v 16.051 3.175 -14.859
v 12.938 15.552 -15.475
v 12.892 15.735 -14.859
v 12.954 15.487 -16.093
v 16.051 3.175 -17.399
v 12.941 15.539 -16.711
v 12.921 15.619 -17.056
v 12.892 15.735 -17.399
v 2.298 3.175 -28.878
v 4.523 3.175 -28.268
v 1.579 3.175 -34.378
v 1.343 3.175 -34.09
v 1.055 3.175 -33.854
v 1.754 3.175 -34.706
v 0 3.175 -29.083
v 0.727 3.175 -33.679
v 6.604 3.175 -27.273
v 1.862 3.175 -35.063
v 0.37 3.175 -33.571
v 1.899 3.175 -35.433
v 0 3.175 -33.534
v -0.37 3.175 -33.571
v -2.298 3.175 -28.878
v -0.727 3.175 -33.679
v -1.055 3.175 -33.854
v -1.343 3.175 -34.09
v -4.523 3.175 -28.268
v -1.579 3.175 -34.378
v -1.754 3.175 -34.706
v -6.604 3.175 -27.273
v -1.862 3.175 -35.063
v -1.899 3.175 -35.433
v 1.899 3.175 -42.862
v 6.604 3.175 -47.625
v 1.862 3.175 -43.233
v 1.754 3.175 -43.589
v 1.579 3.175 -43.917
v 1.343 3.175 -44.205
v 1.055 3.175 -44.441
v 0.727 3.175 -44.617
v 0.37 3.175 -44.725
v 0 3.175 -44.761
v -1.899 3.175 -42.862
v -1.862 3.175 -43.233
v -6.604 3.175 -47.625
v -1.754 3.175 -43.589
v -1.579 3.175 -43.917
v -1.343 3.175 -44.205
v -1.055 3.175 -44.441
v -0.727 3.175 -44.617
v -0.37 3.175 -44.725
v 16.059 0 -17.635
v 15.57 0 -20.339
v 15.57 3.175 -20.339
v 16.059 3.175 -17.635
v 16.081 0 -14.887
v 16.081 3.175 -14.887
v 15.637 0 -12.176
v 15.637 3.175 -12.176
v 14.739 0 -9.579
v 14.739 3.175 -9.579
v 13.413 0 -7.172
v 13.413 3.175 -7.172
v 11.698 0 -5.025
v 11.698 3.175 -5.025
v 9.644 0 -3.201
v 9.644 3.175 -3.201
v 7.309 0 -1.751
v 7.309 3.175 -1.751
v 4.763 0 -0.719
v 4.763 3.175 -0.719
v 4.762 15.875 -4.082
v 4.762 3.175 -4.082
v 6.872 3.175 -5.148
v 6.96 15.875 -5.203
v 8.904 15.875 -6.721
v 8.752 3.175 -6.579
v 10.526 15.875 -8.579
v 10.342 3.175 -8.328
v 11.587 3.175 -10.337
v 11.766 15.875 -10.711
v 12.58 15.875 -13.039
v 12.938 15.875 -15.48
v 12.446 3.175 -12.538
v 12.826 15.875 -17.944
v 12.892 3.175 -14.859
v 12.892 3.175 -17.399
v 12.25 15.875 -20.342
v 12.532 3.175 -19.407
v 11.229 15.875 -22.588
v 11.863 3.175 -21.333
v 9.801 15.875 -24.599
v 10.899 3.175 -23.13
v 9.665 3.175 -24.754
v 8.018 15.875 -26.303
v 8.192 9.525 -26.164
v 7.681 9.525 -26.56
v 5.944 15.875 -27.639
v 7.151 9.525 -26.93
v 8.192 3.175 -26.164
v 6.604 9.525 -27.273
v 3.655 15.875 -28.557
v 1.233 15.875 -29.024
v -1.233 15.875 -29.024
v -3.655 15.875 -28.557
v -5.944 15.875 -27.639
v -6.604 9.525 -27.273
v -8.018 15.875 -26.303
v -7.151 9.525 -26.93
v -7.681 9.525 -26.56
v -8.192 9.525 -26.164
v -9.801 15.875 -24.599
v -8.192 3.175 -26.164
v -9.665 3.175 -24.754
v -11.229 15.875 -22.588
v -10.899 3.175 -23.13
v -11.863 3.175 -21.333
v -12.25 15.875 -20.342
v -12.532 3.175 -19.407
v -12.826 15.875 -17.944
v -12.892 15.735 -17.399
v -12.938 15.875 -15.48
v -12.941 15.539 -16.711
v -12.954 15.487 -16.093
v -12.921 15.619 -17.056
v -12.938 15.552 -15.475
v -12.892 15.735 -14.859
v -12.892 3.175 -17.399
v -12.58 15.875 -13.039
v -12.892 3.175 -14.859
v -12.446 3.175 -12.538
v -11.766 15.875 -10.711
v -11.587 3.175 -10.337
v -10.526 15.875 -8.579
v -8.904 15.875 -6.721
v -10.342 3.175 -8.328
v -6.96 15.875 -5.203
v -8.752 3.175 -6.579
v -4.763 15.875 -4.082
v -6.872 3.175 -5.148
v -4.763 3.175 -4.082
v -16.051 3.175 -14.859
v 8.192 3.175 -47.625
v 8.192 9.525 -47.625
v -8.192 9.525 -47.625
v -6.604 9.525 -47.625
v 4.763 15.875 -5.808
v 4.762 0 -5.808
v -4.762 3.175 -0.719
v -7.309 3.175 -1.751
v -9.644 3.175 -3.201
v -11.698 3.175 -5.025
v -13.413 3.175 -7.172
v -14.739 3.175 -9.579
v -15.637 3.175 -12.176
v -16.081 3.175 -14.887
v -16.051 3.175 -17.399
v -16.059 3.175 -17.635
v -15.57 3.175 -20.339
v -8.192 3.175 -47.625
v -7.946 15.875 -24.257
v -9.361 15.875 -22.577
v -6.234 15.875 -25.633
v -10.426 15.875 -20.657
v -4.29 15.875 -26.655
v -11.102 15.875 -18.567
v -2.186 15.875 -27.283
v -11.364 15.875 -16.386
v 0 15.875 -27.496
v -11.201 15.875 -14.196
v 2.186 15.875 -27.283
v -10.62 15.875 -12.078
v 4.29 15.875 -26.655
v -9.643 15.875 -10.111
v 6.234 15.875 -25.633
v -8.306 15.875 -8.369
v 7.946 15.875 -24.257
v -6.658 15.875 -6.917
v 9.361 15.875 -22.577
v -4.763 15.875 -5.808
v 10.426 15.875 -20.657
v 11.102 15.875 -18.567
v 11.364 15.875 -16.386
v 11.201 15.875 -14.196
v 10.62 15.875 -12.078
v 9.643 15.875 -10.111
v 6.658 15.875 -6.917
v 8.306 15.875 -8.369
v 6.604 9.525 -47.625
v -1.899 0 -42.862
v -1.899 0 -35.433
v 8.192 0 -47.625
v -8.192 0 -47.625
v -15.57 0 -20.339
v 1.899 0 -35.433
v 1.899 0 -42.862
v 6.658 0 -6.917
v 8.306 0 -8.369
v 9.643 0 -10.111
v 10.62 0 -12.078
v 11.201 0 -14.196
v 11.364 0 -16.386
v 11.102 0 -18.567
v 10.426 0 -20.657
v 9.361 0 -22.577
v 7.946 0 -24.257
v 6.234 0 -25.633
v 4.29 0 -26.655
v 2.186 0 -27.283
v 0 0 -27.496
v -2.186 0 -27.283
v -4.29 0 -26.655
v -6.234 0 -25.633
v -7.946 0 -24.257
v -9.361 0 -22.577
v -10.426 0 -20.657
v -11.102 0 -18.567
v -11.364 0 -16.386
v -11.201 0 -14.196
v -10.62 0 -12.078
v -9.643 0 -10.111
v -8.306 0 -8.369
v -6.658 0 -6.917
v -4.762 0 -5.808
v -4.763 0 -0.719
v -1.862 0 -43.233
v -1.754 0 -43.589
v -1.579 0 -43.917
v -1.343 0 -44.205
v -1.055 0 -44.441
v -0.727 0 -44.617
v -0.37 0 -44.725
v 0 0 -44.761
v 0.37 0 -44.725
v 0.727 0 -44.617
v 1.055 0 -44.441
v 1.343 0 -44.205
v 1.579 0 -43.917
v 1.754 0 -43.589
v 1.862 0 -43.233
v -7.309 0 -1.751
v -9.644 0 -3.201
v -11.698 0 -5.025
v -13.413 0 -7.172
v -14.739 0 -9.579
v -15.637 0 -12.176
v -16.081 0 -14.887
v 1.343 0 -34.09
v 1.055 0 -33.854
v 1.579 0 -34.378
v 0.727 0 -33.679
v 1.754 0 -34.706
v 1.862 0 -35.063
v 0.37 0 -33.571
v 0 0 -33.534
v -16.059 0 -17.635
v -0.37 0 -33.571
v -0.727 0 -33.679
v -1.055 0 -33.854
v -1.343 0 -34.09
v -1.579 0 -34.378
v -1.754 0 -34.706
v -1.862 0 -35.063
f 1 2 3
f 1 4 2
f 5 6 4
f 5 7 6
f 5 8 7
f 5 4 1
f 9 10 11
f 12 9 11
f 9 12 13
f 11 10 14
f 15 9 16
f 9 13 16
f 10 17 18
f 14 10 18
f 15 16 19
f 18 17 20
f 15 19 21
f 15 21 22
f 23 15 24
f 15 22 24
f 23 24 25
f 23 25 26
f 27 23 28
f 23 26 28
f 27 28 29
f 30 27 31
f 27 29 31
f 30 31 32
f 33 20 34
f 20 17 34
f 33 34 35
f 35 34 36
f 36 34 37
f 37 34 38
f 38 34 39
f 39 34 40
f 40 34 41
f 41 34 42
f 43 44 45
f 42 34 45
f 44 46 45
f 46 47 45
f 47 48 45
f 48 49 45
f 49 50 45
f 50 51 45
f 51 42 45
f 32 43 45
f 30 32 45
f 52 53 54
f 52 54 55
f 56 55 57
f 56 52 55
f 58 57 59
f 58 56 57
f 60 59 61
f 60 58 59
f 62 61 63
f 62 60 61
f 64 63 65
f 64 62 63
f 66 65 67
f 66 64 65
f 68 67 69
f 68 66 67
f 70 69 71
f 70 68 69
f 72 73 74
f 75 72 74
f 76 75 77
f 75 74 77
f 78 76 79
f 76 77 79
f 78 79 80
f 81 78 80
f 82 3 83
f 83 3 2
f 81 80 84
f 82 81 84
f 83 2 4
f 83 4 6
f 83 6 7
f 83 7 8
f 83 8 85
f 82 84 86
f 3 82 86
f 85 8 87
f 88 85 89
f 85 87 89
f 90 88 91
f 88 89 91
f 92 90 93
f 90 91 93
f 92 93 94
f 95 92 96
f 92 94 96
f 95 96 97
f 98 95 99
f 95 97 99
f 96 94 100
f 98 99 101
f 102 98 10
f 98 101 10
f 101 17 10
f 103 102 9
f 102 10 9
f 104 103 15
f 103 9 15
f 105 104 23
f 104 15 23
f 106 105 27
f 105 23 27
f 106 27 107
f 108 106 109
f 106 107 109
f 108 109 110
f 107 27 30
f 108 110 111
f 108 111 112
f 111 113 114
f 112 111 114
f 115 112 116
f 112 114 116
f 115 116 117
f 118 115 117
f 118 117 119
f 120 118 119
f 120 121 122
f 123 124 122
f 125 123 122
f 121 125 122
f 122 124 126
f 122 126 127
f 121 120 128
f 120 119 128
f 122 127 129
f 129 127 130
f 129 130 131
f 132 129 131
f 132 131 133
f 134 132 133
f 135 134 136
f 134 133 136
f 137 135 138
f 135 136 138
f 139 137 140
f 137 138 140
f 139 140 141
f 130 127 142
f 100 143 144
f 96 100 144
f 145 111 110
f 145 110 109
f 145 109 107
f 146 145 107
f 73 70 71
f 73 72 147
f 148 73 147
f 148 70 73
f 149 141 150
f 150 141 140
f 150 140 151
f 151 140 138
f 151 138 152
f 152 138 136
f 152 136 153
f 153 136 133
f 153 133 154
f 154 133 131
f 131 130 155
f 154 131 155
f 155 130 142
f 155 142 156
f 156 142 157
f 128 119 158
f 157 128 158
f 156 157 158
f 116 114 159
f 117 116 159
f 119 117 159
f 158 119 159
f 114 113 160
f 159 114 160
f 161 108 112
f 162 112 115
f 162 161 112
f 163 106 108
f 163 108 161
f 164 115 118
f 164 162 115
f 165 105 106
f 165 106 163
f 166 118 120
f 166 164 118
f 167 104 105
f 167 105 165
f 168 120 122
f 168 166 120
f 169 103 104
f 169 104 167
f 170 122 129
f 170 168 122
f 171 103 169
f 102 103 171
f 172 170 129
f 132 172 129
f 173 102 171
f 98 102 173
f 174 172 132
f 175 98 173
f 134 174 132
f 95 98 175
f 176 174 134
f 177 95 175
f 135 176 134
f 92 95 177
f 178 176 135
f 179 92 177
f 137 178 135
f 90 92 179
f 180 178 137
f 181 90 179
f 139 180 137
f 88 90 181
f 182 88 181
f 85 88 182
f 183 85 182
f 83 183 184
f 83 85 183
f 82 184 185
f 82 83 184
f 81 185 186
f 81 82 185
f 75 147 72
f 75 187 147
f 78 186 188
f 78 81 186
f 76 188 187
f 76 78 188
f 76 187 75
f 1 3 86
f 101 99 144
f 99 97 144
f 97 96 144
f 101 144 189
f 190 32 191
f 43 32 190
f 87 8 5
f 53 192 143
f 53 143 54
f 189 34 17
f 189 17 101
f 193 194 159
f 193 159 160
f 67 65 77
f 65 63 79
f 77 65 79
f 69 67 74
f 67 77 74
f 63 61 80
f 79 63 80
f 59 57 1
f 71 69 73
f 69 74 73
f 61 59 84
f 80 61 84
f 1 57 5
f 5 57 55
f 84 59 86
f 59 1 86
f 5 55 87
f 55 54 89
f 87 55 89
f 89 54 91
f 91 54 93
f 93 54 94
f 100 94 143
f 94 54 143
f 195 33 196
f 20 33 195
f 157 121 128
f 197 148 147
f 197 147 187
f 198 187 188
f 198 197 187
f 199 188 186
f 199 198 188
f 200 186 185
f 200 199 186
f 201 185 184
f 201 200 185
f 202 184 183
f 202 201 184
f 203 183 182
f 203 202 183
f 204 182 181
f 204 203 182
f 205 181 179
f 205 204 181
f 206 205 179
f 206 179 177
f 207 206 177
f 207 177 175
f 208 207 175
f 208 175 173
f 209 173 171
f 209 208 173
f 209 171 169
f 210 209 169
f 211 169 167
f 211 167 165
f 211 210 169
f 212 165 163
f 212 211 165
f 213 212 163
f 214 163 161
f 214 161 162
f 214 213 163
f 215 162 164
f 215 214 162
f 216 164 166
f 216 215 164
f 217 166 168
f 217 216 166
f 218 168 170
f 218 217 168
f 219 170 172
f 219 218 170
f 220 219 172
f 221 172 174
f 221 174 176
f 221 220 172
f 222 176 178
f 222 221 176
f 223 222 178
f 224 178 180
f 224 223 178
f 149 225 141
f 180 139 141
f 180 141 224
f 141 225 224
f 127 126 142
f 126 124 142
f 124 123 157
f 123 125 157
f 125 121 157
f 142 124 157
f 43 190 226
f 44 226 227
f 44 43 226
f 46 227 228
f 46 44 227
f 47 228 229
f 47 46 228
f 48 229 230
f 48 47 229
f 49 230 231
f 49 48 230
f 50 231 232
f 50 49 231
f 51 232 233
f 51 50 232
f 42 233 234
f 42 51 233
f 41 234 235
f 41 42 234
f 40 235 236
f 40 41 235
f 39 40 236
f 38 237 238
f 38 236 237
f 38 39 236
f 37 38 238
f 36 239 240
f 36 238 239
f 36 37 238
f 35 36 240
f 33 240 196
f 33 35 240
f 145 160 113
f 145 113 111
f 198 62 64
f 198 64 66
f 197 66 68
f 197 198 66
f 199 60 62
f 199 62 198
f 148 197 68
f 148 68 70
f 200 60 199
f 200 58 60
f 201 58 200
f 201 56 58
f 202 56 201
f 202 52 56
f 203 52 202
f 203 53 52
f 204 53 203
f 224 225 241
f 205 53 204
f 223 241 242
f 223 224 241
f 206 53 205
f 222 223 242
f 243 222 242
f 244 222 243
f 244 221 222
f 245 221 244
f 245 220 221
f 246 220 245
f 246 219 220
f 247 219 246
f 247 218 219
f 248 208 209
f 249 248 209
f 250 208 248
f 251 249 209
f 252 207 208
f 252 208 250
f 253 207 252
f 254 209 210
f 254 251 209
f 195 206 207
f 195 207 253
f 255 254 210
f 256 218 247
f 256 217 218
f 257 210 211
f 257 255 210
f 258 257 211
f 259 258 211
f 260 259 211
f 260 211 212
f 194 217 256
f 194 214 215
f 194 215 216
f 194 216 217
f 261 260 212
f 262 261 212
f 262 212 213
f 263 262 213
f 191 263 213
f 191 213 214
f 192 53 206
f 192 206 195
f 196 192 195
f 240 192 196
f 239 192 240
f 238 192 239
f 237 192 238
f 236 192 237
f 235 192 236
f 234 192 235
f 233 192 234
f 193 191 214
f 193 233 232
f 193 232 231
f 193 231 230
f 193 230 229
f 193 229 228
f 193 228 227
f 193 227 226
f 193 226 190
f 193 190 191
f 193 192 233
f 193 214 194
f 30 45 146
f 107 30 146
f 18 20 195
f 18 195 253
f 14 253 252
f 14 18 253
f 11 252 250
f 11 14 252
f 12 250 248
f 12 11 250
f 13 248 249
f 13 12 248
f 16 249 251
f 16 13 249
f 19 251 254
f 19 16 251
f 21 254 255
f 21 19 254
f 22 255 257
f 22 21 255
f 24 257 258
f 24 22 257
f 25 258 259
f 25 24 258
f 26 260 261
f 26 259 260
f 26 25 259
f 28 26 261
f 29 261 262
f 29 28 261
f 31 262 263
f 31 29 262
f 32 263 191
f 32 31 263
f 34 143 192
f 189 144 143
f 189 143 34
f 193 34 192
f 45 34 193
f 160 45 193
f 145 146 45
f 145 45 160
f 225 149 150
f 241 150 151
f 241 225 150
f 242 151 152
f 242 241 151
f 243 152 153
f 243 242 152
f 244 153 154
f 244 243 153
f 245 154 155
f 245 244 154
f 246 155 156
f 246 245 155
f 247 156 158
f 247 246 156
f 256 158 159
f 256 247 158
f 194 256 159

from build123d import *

# Parameters (mm, degrees)
SKETCH8_R           = 11.3665
BOSS_EXTRUDE3_DEPTH = 3.175
SKETCH9_R           = 12.954
SKETCH9_R_2         = 11.3665
BOSS_EXTRUDE4_DEPTH = 12.7
RIB12_REACH         = 40.783
SKETCH13_WALL_W     = 92.662520058
SKETCH13_WALL_H     = 2.54
CUT_EXTRUDE1_DEPTH  = 52.861115163
RIB1_START          = -47.625
RIB1_OUTLINE_W      = 1.5875
RIB1_OUTLINE_H      = 6.35
RIB1_DEPTH          = 21.4607898
SKETCH16_W          = 9.525
SKETCH16_H          = 15.588386278
CUT_EXTRUDE3_DEPTH  = 53.72855859


# Read off the part's stored shape, not the designer's step: Rib1
with BuildPart() as part:
    # Sketch8 → Boss-Extrude3 (new body)
    with BuildSketch(Plane(origin=(0, 0, 0), x_dir=(1, 0, 0), z_dir=(0, 1, 0))):
        with BuildLine():
            Line((-8.1915, 47.625), (8.1915, 47.625))
            Line((8.1915, 47.625), (15.569804863, 20.339203977))
            ThreePointArc((15.569804863, 20.339203977), (0, 0), (-15.569804863, 20.339203977))
            Line((-15.569804863, 20.339203977), (-8.1915, 47.625))
        make_face()
        with Locations(Location((0, 16.129, 0), (0, 0, 270))):
            Circle(SKETCH8_R, mode=Mode.SUBTRACT)
    extrude(amount=BOSS_EXTRUDE3_DEPTH)

    # Sketch9 → Boss-Extrude4 (add)
    with BuildSketch(Plane(origin=(0, 3.175, 0), x_dir=(1, 0, 0), z_dir=(0, 1, 0))):
        with Locations(Location((0, 16.129, 0), (0, 0, 270))):
            Circle(SKETCH9_R)
        with Locations(Location((0, 16.129, 0), (0, 0, 270))):
            Circle(SKETCH9_R_2, mode=Mode.SUBTRACT)
    extrude(amount=BOSS_EXTRUDE4_DEPTH)

    # Sketch13 wall → Rib12 (add, up to next)
    with BuildSketch(Plane(origin=(-14.453521799, 9.525, -16.129), x_dir=(-0.243924343996, -0.969794263958, 0), z_dir=(0.969794263958, -0.243924343996, 0)), mode=Mode.PRIVATE) as rib12_sk1:
        Rectangle(SKETCH13_WALL_W, SKETCH13_WALL_H)
    rib12_tool1 = extrude(rib12_sk1.sketch, amount=RIB12_REACH, mode=Mode.PRIVATE) - part.part
    rib12 = rib12_tool1.solids().sort_by_distance((-14.453521799, 9.525, -16.129))[0]
    add(rib12)

    # Mirror2: Rib12 across plane
    add(rib12.mirror(Plane(origin=(0, 0, 0), x_dir=(0, 0, 1), z_dir=(1, 0, 0))))

    # Sketch11 → Cut-Extrude1 (cut, through all)
    with BuildSketch(Plane(origin=(0, 3.175, 0), x_dir=(1, 0, 0), z_dir=(0, 1, 0))):
        with BuildLine():
            Line((1.89865, 42.8625), (1.89865, 35.433))
            ThreePointArc((1.89865, 35.433), (0, 33.53435), (-1.89865, 35.433))
            Line((-1.89865, 35.433), (-1.89865, 42.8625))
            ThreePointArc((-1.89865, 42.8625), (0, 44.76115), (1.89865, 42.8625))
        make_face()
    extrude(amount=-CUT_EXTRUDE1_DEPTH, mode=Mode.SUBTRACT)

    # Rib1 outline → Rib1 (add)
    with BuildSketch(Plane.XY.offset(RIB1_START)):
        with Locations((-7.39775, 6.35)):
            Rectangle(RIB1_OUTLINE_W, RIB1_OUTLINE_H)
    rib1 = extrude(amount=RIB1_DEPTH)

    # Mirror1: Rib1 across plane
    add(rib1.mirror(Plane(origin=(0, 0, 0), x_dir=(0, 0, 1), z_dir=(1, 0, 0))))

    # Sketch16 → Cut-Extrude3 (cut, through all)
    with BuildSketch(Plane(origin=(0, 0, 0), x_dir=(1, 0, 0), z_dir=(0, 1, 0))):
        Rectangle(SKETCH16_W, SKETCH16_H)
    extrude(amount=CUT_EXTRUDE3_DEPTH, mode=Mode.SUBTRACT)


solid = part.part
